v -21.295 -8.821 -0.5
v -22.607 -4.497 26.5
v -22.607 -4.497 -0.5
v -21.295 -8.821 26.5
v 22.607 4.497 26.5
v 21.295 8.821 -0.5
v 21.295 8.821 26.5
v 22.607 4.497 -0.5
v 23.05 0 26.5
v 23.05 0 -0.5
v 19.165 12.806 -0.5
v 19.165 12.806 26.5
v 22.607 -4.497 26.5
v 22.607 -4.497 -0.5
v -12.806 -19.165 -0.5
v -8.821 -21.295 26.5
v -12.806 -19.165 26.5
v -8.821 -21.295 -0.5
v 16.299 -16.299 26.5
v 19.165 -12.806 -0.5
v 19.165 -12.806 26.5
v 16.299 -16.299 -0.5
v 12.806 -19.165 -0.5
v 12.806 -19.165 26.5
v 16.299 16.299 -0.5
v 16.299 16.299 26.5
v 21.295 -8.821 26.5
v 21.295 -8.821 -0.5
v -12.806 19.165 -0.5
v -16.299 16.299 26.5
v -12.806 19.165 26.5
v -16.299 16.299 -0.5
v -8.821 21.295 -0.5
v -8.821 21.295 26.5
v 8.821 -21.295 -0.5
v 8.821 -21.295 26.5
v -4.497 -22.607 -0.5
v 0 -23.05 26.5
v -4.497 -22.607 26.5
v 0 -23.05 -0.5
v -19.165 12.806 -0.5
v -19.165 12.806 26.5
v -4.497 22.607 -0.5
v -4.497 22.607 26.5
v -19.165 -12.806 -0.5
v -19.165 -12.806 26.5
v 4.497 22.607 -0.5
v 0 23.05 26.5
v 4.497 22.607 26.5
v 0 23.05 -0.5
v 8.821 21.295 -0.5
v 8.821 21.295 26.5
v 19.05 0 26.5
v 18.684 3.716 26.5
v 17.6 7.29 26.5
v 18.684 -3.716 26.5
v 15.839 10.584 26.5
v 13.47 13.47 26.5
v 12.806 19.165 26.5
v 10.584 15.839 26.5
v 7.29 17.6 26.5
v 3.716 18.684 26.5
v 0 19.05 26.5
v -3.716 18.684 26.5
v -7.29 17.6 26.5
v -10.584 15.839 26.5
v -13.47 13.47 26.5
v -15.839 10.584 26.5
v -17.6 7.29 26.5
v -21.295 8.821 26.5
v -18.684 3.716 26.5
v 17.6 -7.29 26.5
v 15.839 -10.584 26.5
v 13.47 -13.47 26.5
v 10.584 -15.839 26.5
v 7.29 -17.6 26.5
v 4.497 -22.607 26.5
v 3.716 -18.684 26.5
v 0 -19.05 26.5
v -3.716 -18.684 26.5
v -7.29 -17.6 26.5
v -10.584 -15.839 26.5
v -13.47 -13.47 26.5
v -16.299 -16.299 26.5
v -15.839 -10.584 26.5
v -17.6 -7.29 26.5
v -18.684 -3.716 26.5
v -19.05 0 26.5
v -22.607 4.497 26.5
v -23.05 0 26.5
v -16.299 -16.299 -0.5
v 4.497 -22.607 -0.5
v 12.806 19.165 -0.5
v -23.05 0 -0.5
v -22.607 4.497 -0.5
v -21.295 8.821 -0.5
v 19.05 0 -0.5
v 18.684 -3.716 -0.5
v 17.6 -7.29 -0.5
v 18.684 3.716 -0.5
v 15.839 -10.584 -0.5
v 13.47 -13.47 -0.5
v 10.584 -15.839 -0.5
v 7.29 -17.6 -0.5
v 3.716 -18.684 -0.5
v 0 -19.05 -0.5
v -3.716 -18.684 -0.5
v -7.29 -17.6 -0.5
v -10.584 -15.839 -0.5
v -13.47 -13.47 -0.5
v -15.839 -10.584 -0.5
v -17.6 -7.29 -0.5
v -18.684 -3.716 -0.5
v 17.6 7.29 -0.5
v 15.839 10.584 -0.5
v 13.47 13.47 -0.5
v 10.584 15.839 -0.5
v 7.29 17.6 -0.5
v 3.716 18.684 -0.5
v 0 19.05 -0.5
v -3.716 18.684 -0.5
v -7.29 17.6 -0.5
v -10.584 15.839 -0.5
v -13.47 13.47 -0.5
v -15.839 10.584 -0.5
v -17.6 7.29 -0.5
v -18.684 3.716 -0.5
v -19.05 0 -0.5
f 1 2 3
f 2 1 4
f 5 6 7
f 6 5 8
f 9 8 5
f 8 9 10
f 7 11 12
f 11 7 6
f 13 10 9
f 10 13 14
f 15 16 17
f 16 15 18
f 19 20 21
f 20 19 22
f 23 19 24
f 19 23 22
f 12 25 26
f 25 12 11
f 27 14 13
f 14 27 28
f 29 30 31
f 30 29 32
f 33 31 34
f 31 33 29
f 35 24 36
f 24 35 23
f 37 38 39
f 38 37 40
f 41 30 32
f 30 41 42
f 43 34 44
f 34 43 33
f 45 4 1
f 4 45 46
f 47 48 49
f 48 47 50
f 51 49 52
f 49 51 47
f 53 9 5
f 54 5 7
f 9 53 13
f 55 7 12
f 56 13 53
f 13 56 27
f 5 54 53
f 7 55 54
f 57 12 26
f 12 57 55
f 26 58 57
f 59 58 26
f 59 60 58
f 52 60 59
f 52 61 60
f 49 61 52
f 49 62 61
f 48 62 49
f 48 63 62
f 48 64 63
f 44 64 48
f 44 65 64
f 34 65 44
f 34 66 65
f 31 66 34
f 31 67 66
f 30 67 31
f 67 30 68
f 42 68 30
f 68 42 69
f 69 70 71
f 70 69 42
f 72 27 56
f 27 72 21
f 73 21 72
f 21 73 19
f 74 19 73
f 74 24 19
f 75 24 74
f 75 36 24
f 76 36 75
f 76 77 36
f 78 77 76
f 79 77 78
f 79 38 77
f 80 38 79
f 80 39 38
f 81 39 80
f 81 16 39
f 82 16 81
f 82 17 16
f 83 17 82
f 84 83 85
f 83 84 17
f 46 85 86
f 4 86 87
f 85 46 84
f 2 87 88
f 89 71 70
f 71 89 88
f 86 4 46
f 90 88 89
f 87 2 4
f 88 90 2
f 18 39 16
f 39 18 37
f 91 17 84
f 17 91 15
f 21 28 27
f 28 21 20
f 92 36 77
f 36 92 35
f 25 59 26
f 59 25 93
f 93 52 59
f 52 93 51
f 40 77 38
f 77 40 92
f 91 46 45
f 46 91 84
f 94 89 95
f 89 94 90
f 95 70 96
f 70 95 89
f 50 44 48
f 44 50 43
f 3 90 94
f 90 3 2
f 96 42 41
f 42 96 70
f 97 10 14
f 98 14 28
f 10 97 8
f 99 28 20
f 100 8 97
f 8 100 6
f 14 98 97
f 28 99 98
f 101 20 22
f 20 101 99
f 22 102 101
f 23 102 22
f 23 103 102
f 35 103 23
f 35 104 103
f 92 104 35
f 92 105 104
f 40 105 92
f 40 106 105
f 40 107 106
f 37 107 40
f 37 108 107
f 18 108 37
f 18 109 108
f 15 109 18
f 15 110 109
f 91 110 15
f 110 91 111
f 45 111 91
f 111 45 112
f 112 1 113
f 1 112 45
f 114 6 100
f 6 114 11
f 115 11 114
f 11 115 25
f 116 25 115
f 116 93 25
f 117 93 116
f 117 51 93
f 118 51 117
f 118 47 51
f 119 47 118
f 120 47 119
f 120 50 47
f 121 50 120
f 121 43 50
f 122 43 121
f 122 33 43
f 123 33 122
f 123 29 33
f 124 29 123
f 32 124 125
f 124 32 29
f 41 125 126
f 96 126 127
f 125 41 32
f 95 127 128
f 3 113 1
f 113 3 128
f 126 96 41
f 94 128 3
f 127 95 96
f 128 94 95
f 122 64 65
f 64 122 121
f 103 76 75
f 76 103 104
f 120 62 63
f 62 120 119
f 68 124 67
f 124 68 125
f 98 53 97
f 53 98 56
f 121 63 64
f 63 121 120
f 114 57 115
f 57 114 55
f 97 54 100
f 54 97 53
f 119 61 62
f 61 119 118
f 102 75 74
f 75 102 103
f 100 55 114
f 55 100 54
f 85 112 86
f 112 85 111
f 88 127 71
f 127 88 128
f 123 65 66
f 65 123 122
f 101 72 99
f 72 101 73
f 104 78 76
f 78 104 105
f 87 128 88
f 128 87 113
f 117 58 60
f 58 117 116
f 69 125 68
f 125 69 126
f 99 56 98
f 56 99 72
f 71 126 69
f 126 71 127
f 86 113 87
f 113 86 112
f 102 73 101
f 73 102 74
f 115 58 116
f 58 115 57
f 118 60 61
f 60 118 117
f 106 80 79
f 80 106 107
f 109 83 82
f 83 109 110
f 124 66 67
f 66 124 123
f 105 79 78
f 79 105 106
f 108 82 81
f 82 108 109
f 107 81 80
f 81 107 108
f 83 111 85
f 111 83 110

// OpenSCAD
$fn = 32;

// ----------------------------------------------------------------------
// Two-module gear rim: z12 m2 and z28 m1.5, 26 mm wide
// ----------------------------------------------------------------------

// --- parameters (mm) ---
module_a = 2;             // first tooth module
teeth_a = 12;             // first band tooth count
module_b = 1.5;           // second tooth module
teeth_b = 28;             // second band tooth count
band_h = 10;              // height of one tooth band
web_t = 6;                // web thickness between the bands
total = 26;               // overall width over both bands
root_r = 9.5;             // root radius of the coarse band
hub_r = 23.05;            // hub radius
bore_d = 38.1;            // hub bore
hole_count = 5;           // lightening holes
hole_r = 7.75;            // lightening hole circle radius
hole_d = 4;               // lightening hole diameter

band_a = [[9.4, -1.378], [12.124, -1.51], [13.058, -1.154], [13.986, -0.621], [13.986, 0.621], [13.058, 1.154], [12.124, 1.51], [9.4, 1.378], [8.829, 3.507], [11.254, 4.755], [11.885, 5.53], [12.423, 6.456], [11.802, 7.531], [10.732, 7.528], [9.745, 7.369], [7.451, 5.893], [5.893, 7.451], [7.369, 9.745], [7.528, 10.732], [7.531, 11.802], [6.456, 12.423], [5.53, 11.885], [4.755, 11.254], [3.507, 8.829], [1.378, 9.4], [1.51, 12.124], [1.154, 13.058], [0.621, 13.986], [-0.621, 13.986], [-1.154, 13.058], [-1.51, 12.124], [-1.378, 9.4], [-3.507, 8.829], [-4.755, 11.254], [-5.53, 11.885], [-6.456, 12.423], [-7.531, 11.802], [-7.528, 10.732], [-7.369, 9.745], [-5.893, 7.451], [-7.451, 5.893], [-9.745, 7.369], [-10.732, 7.528], [-11.802, 7.531], [-12.423, 6.456], [-11.885, 5.53], [-11.254, 4.755], [-8.829, 3.507], [-9.4, 1.378], [-12.124, 1.51], [-13.058, 1.154], [-13.986, 0.621], [-13.986, -0.621], [-13.058, -1.154], [-12.124, -1.51], [-9.4, -1.378], [-8.829, -3.507], [-11.254, -4.755], [-11.885, -5.53], [-12.423, -6.456], [-11.802, -7.531], [-10.732, -7.528], [-9.745, -7.369], [-7.451, -5.893], [-5.893, -7.451], [-7.369, -9.745], [-7.528, -10.732], [-7.531, -11.802], [-6.456, -12.423], [-5.53, -11.885], [-4.755, -11.254], [-3.507, -8.829], [-1.378, -9.4], [-1.51, -12.124], [-1.154, -13.058], [-0.621, -13.986], [0.621, -13.986], [1.154, -13.058], [1.51, -12.124], [1.378, -9.4], [3.507, -8.829], [4.755, -11.254], [5.53, -11.885], [6.456, -12.423], [7.531, -11.802], [7.528, -10.732], [7.369, -9.745], [5.893, -7.451], [7.451, -5.893], [9.745, -7.369], [10.732, -7.528], [11.802, -7.531], [12.423, -6.456], [11.885, -5.53], [11.254, -4.755], [8.829, -3.507]];
band_b = [[19.077, -1.355], [20.65, -1.265], [21.573, -0.967], [22.493, -0.548], [22.493, 0.548], [21.573, 0.967], [20.65, 1.265], [19.077, 1.355], [18.9, 2.924], [20.414, 3.362], [21.247, 3.858], [22.051, 4.471], [21.807, 5.54], [20.817, 5.743], [19.851, 5.828], [18.297, 5.566], [17.775, 7.057], [19.154, 7.82], [19.856, 8.489], [20.504, 9.266], [20.028, 10.253], [19.017, 10.231], [18.057, 10.099], [16.6, 9.498], [15.76, 10.835], [16.934, 11.886], [17.469, 12.695], [17.928, 13.596], [17.244, 14.453], [16.264, 14.206], [15.357, 13.864], [14.07, 12.953], [12.953, 14.07], [13.864, 15.357], [14.206, 16.264], [14.453, 17.244], [13.596, 17.928], [12.695, 17.469], [11.886, 16.934], [10.835, 15.76], [9.498, 16.6], [10.099, 18.057], [10.231, 19.017], [10.253, 20.028], [9.266, 20.504], [8.489, 19.856], [7.82, 19.154], [7.057, 17.775], [5.566, 18.297], [5.828, 19.851], [5.743, 20.817], [5.54, 21.807], [4.471, 22.051], [3.858, 21.247], [3.362, 20.414], [2.924, 18.9], [1.355, 19.077], [1.265, 20.65], [0.967, 21.573], [0.548, 22.493], [-0.548, 22.493], [-0.967, 21.573], [-1.265, 20.65], [-1.355, 19.077], [-2.924, 18.9], [-3.362, 20.414], [-3.858, 21.247], [-4.471, 22.051], [-5.54, 21.807], [-5.743, 20.817], [-5.828, 19.851], [-5.566, 18.297], [-7.057, 17.775], [-7.82, 19.154], [-8.489, 19.856], [-9.266, 20.504], [-10.253, 20.028], [-10.231, 19.017], [-10.099, 18.057], [-9.498, 16.6], [-10.835, 15.76], [-11.886, 16.934], [-12.695, 17.469], [-13.596, 17.928], [-14.453, 17.244], [-14.206, 16.264], [-13.864, 15.357], [-12.953, 14.07], [-14.07, 12.953], [-15.357, 13.864], [-16.264, 14.206], [-17.244, 14.453], [-17.928, 13.596], [-17.469, 12.695], [-16.934, 11.886], [-15.76, 10.835], [-16.6, 9.498], [-18.057, 10.099], [-19.017, 10.231], [-20.028, 10.253], [-20.504, 9.266], [-19.856, 8.489], [-19.154, 7.82], [-17.775, 7.057], [-18.297, 5.566], [-19.851, 5.828], [-20.817, 5.743], [-21.807, 5.54], [-22.051, 4.471], [-21.247, 3.858], [-20.414, 3.362], [-18.9, 2.924], [-19.077, 1.355], [-20.65, 1.265], [-21.573, 0.967], [-22.493, 0.548], [-22.493, -0.548], [-21.573, -0.967], [-20.65, -1.265], [-19.077, -1.355], [-18.9, -2.924], [-20.414, -3.362], [-21.247, -3.858], [-22.051, -4.471], [-21.807, -5.54], [-20.817, -5.743], [-19.851, -5.828], [-18.297, -5.566], [-17.775, -7.057], [-19.154, -7.82], [-19.856, -8.489], [-20.504, -9.266], [-20.028, -10.253], [-19.017, -10.231], [-18.057, -10.099], [-16.6, -9.498], [-15.76, -10.835], [-16.934, -11.886], [-17.469, -12.695], [-17.928, -13.596], [-17.244, -14.453], [-16.264, -14.206], [-15.357, -13.864], [-14.07, -12.953], [-12.953, -14.07], [-13.864, -15.357], [-14.206, -16.264], [-14.453, -17.244], [-13.596, -17.928], [-12.695, -17.469], [-11.886, -16.934], [-10.835, -15.76], [-9.498, -16.6], [-10.099, -18.057], [-10.231, -19.017], [-10.253, -20.028], [-9.266, -20.504], [-8.489, -19.856], [-7.82, -19.154], [-7.057, -17.775], [-5.566, -18.297], [-5.828, -19.851], [-5.743, -20.817], [-5.54, -21.807], [-4.471, -22.051], [-3.858, -21.247], [-3.362, -20.414], [-2.924, -18.9], [-1.355, -19.077], [-1.265, -20.65], [-0.967, -21.573], [-0.548, -22.493], [0.548, -22.493], [0.967, -21.573], [1.265, -20.65], [1.355, -19.077], [2.924, -18.9], [3.362, -20.414], [3.858, -21.247], [4.471, -22.051], [5.54, -21.807], [5.743, -20.817], [5.828, -19.851], [5.566, -18.297], [7.057, -17.775], [7.82, -19.154], [8.489, -19.856], [9.266, -20.504], [10.253, -20.028], [10.231, -19.017], [10.099, -18.057], [9.498, -16.6], [10.835, -15.76], [11.886, -16.934], [12.695, -17.469], [13.596, -17.928], [14.453, -17.244], [14.206, -16.264], [13.864, -15.357], [12.953, -14.07], [14.07, -12.953], [15.357, -13.864], [16.264, -14.206], [17.244, -14.453], [17.928, -13.596], [17.469, -12.695], [16.934, -11.886], [15.76, -10.835], [16.6, -9.498], [18.057, -10.099], [19.017, -10.231], [20.028, -10.253], [20.504, -9.266], [19.856, -8.489], [19.154, -7.82], [17.775, -7.057], [18.297, -5.566], [19.851, -5.828], [20.817, -5.743], [21.807, -5.54], [22.051, -4.471], [21.247, -3.858], [20.414, -3.362], [18.9, -2.924]];

difference() {
  union() {
    /* tooth band A, overlapping the web by 0.4 mm */
    linear_extrude(height = band_h + 0.4) polygon(band_a);
    /* web */
    translate([0, 0, band_h - 0.4]) cylinder(h = web_t + 0.8, d = 2 * root_r);
    /* tooth band B */
    translate([0, 0, band_h + web_t]) linear_extrude(height = band_h + 0.4) polygon(band_b);
    /* hub */
    translate([0, 0, -0.5]) cylinder(h = total + 1.0, d = 2 * hub_r);
  }
  /* bore */
  translate([0, 0, -2.5]) cylinder(h = total + 5, d = bore_d);
  /* lightening holes through the web */
  for (i = [0 : hole_count - 1]) {
    a = i * 360 / hole_count;
    translate([hole_r * cos(a), hole_r * sin(a), -2.5]) cylinder(h = total + 5, d = hole_d);
  }
}
